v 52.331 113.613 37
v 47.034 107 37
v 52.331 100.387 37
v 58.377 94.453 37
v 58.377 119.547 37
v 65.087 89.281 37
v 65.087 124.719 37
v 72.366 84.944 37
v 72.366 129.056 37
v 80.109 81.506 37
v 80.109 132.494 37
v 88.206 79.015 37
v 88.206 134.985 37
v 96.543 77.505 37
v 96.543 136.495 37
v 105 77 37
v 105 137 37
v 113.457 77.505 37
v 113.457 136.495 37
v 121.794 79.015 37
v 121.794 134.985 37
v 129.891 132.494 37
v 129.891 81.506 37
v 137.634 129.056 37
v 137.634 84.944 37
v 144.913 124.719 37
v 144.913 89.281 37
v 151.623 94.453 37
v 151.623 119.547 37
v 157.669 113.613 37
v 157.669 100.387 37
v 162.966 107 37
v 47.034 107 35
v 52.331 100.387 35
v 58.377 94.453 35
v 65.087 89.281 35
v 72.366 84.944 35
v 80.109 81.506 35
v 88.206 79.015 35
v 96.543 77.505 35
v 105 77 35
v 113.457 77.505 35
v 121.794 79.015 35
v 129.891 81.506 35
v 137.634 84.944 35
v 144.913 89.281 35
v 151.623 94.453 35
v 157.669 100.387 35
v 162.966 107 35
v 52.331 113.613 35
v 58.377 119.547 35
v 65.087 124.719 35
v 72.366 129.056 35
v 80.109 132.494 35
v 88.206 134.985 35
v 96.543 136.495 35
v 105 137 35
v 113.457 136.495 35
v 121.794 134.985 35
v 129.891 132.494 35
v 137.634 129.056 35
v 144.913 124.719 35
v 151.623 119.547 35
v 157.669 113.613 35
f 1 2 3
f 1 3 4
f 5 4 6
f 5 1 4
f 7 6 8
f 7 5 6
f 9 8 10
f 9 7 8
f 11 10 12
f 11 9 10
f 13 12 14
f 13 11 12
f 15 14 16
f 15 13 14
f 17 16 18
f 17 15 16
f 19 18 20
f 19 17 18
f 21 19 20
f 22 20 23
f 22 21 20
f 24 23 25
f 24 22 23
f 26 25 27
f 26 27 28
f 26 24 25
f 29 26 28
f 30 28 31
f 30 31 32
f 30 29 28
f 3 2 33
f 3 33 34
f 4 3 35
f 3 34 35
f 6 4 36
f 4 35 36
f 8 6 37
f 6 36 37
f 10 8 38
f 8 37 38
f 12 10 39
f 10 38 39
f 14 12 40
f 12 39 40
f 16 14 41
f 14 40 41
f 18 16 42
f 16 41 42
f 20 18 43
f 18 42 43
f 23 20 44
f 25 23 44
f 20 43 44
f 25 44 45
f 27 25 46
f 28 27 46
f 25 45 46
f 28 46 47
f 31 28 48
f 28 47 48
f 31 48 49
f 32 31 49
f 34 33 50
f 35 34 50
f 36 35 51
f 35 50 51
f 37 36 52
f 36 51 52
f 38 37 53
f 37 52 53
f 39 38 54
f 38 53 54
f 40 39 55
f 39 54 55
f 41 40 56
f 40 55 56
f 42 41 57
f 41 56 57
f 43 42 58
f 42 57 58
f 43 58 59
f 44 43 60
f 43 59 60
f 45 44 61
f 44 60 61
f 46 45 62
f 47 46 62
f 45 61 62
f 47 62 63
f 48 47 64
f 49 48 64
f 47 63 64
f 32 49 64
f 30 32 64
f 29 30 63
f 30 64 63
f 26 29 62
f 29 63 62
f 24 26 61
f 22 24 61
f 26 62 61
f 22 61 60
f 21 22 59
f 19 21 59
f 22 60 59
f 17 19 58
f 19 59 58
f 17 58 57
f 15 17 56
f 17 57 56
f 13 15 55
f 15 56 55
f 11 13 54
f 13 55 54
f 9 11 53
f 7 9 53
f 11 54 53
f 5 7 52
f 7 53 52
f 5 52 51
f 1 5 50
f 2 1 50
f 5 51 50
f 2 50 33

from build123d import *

# Parameters (mm, degrees)
CYLINDER068_R     = 71
CYLINDER068_DEPTH = 2
CYLINDER069_R     = 71
CYLINDER069_DEPTH = 2


with BuildPart() as cylinder:
    # Cylinder068 → Cylinder068 (new body)
    with BuildSketch(Plane(origin=(105, 148, 35), x_dir=(1, 0, 0), z_dir=(0, 0, 1))):
        Circle(CYLINDER068_R)
    extrude(amount=CYLINDER068_DEPTH)


with BuildPart() as bafflediff:
    # Cylinder069 → Cylinder069 (new body)
    with BuildSketch(Plane(origin=(105, 66, 35), x_dir=(1, 0, 0), z_dir=(0, 0, 1))):
        Circle(CYLINDER069_R)
    extrude(amount=CYLINDER069_DEPTH)

    # Common001: intersect Cylinder
    add(cylinder.part, mode=Mode.INTERSECT)


solid = bafflediff.part
